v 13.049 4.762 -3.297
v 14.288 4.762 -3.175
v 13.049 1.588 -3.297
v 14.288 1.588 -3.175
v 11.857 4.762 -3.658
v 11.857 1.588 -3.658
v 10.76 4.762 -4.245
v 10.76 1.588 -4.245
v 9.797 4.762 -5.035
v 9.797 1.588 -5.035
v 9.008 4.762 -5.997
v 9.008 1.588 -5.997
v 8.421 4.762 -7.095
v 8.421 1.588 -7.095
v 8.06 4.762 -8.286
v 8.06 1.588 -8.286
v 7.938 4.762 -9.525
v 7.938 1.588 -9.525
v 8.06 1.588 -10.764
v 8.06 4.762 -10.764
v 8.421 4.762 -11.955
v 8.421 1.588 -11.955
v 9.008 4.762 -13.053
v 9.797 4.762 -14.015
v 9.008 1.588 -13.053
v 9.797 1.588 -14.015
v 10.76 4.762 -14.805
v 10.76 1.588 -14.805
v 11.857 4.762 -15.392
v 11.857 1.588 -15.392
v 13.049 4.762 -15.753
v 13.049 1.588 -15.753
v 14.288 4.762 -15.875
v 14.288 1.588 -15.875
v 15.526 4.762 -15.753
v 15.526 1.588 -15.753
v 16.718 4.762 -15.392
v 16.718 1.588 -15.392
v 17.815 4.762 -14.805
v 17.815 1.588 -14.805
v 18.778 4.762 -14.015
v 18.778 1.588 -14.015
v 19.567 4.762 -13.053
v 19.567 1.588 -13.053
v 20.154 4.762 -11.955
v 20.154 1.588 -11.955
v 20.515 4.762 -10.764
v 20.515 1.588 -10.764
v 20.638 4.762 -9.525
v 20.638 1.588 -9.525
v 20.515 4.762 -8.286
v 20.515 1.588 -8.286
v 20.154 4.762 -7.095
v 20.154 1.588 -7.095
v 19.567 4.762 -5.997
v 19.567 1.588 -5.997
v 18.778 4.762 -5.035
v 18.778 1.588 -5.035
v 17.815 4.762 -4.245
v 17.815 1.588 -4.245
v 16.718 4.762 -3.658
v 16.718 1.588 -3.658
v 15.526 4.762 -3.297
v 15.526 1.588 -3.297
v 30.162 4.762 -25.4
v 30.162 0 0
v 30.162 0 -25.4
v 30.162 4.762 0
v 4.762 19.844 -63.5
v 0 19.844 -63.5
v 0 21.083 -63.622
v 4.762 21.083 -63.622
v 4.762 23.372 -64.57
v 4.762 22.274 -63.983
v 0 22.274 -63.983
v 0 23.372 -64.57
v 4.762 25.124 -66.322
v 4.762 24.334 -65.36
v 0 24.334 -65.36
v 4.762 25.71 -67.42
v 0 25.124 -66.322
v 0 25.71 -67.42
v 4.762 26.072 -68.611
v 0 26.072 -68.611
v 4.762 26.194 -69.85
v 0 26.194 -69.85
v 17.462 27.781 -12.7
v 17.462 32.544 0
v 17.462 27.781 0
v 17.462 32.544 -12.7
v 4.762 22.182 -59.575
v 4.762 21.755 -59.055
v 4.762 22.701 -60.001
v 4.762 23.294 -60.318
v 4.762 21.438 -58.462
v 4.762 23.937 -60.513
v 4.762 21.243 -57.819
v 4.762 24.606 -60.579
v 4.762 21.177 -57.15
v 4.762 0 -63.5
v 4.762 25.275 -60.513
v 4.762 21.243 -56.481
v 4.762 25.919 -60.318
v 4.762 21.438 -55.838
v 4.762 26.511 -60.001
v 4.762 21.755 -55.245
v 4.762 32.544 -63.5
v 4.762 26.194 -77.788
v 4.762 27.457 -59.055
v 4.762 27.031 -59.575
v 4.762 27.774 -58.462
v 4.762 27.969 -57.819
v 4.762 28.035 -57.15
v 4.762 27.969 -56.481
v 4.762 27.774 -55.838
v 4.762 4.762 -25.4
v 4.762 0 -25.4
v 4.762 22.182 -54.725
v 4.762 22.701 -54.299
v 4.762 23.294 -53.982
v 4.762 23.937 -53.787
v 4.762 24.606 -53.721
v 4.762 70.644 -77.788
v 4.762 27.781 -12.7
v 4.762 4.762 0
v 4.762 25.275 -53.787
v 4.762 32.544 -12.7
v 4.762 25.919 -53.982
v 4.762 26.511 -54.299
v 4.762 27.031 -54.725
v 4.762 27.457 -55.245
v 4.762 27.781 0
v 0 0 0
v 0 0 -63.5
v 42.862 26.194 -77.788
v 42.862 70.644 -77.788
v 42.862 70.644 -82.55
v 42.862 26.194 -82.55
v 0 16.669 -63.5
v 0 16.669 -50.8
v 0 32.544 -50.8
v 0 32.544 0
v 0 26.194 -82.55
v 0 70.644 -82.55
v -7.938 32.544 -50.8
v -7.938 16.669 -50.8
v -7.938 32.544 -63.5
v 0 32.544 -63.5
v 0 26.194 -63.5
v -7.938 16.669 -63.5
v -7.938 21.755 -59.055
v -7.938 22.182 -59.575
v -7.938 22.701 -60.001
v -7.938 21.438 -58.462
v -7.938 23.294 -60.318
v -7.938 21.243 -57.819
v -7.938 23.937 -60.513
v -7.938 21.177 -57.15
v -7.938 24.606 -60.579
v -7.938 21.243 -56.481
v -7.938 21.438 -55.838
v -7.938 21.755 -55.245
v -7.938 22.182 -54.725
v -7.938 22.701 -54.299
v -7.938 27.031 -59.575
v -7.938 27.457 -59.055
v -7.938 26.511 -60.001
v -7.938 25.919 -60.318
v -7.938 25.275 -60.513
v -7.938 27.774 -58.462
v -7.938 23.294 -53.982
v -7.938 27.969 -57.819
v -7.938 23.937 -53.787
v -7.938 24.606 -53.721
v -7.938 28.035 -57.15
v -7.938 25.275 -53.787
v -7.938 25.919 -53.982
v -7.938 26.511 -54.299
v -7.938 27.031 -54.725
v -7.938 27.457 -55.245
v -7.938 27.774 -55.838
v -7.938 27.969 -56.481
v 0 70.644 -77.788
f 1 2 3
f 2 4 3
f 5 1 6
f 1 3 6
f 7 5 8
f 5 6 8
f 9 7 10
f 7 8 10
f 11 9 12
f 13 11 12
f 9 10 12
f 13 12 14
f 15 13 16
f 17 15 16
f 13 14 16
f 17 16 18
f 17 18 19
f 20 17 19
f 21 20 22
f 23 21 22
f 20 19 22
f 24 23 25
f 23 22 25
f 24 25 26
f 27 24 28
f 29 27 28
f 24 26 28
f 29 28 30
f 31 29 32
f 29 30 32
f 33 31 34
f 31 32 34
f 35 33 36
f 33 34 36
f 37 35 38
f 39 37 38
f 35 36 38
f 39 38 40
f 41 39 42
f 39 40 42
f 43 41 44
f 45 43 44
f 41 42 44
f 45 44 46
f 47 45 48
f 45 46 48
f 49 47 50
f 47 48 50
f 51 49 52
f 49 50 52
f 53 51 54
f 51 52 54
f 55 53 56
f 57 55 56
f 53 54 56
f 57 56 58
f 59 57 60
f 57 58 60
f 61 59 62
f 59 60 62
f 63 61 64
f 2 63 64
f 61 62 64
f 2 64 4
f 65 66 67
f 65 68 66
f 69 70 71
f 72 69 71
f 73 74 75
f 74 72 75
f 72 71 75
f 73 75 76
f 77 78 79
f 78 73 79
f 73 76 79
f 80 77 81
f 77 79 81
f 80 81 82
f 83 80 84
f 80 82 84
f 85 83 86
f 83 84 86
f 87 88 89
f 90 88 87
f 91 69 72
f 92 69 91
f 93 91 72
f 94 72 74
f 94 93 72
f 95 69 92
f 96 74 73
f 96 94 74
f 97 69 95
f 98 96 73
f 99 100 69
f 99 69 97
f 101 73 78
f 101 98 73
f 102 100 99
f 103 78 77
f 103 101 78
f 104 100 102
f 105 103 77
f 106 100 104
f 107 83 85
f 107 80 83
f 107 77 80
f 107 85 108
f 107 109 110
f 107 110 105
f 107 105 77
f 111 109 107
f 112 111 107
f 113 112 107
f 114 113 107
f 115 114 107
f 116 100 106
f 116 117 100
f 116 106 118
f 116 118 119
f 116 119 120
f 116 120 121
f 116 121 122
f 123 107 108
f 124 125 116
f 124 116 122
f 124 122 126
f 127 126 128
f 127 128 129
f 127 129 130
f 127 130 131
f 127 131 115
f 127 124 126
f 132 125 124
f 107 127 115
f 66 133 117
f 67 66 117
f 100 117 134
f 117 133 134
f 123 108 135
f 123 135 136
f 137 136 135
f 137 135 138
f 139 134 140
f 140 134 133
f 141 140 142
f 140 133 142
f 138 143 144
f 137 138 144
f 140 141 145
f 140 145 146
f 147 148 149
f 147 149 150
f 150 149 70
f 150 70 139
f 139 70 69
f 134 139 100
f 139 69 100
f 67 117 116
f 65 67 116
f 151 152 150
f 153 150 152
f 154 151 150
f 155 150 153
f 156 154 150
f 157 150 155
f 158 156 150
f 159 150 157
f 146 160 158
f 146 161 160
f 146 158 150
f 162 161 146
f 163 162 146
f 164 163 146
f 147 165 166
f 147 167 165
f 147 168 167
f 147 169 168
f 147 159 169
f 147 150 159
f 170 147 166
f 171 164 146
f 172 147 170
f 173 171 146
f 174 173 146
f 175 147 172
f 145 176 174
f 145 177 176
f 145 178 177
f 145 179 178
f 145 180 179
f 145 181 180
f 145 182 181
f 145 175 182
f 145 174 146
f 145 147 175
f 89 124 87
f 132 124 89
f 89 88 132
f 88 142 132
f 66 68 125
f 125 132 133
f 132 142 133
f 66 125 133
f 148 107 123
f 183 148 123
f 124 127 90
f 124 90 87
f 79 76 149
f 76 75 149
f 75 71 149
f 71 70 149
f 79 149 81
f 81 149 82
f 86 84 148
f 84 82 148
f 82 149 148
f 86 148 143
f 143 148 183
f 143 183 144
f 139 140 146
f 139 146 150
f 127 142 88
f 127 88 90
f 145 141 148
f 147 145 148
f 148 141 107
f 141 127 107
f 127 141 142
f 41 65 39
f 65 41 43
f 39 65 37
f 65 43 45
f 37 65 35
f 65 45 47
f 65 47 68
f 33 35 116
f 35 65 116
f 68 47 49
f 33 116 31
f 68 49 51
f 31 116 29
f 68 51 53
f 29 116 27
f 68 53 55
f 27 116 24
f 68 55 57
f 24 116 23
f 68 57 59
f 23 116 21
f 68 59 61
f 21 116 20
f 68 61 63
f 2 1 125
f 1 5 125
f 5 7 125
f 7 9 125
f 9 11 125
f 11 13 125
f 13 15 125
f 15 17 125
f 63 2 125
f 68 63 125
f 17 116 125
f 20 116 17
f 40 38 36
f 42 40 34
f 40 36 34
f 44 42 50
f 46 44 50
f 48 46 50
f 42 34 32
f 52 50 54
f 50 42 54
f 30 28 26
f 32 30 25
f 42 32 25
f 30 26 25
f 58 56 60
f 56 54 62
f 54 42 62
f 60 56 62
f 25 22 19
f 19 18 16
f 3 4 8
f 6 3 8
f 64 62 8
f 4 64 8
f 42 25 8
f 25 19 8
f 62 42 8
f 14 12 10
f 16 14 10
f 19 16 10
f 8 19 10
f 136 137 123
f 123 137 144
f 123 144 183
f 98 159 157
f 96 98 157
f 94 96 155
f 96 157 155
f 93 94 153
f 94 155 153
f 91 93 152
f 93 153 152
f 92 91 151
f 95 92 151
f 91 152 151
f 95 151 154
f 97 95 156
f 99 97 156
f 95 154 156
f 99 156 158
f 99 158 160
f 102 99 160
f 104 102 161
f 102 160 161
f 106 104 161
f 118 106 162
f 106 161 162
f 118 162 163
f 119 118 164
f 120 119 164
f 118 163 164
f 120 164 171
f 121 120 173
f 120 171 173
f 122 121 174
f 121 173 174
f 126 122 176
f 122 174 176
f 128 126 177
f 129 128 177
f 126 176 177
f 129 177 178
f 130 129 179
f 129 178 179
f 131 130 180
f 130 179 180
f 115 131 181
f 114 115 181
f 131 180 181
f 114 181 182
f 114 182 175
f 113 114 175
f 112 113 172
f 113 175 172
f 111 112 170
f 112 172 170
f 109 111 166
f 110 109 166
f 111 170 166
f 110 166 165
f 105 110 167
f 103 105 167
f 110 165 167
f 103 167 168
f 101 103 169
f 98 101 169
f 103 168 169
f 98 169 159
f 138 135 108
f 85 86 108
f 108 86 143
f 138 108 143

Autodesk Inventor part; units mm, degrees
ref_plane "YZ Plane" through (0, 0, 0) normal (1, 0, 0) x (0, 1, 0)
ref_plane "XZ Plane" through (0, 0, 0) normal (0, 1, 0) x (-1, 0, 0)
ref_plane "XY Plane" through (0, 0, 0) normal (0, 0, 1) x (1, 0, 0)
sketch "Sketch1" plane through (0, 0, 0) normal (1, 0, 0) x (0, 1, 0)
  line L0 (0, 0) -> (32.5438, 0)
  line L1 (32.5438, 0) -> (32.5438, -63.5)
  line L2 (32.5438, -63.5) -> (0, -63.5)
  line L3 (0, -63.5) -> (0, 0)
  dimension "d0" = 32.5438
  dimension "d1" = 63.5
extrude "Extrusion1" add sketch "Sketch1" along normal blind 4.7625
sketch "Sketch2" plane through (4.7625, 0, 0) normal (1, 0, 0) x (0, 0, -1)
  line L0 (0, 32.5438) -> (0, 0) projected
  line L1 (0, 0) -> (63.5, 0) projected
  line L2 (63.5, 0) -> (63.5, 32.5438) projected
  line L3 (63.5, 32.5438) -> (0, 32.5438) projected
  line L4 (0, 32.5438) -> (12.7, 32.5438)
  line L5 (12.7, 32.5438) -> (12.7, 27.7812)
  line L6 (12.7, 27.7812) -> (0, 27.7812)
  line L7 (0, 27.7812) -> (0, 32.5438)
  dimension "d4" = 12.7
  dimension "d5" = 4.7625
extrude "Extrusion2" add sketch "Sketch2" along normal blind 12.7 contours L3 L5 L6 L0
sketch "Sketch3" plane through (4.7625, 0, 0) normal (1, 0, 0) x (0, 0, -1)
  line L0 (12.7, 27.7812) -> (0, 27.7812) projected
  line L1 (0, 27.7812) -> (0, 0) projected
  line L2 (0, 0) -> (63.5, 0) projected
  line L3 (63.5, 0) -> (63.5, 32.5438) projected
  line L4 (63.5, 32.5438) -> (12.7, 32.5438) projected
  line L5 (12.7, 32.5438) -> (12.7, 27.7812) projected
  line L6 (0, 0) -> (25.4, 0)
  line L7 (25.4, 0) -> (25.4, 4.7625)
  line L8 (25.4, 4.7625) -> (0, 4.7625)
  line L9 (0, 4.7625) -> (0, 0)
  dimension "d8" = 4.7625
extrude "Extrusion3" add sketch "Sketch3" along normal blind 25.4 contours L8 L7 L2 L1
sketch "Sketch4" plane through (0, 0, 0) normal (-1, 0, 0) x (0, 0, 1)
  line L0 (0, 0) -> (0, 32.5438) projected
  line L1 (0, 32.5438) -> (-63.5, 32.5438) projected
  line L2 (-63.5, 32.5438) -> (-63.5, 0) projected
  line L3 (-63.5, 0) -> (0, 0) projected
  line L4 (-63.5, 32.5438) -> (-12.7, 32.5438) projected
  line L5 (-63.5, 32.5438) -> (-50.8, 32.5438)
  line L6 (-50.8, 32.5438) -> (-50.8, 16.6688)
  line L7 (-50.8, 16.6688) -> (-63.5, 16.6688)
  line L8 (-63.5, 16.6688) -> (-63.5, 32.5438)
  dimension "d11" = 12.7
  dimension "d12" = 15.875
extrude "Extrusion4" add sketch "Sketch4" along normal blind 7.9375 contours L2 L1 L6 L7
sketch "Sketch5" plane through (4.7625, 0, 0) normal (1, 0, 0) x (0, 0, -1)
  line L0 (25.4, 4.7625) -> (25.4, 0) projected
  line L1 (25.4, 0) -> (63.5, 0) projected
  line L2 (63.5, 0) -> (63.5, 32.5438) projected
  line L3 (63.5, 32.5438) -> (12.7, 32.5438) projected
  line L4 (12.7, 32.5438) -> (12.7, 27.7812) projected
  line L5 (12.7, 27.7812) -> (0, 27.7812) projected
  line L6 (0, 27.7812) -> (0, 4.7625) projected
  line L7 (0, 4.7625) -> (25.4, 4.7625) projected
  line L8 (0, 32.5438) -> (0, 27.7812) projected
  line L9 (0, 27.7812) -> (12.7, 27.7812) projected
  line L10 (12.7, 27.7812) -> (12.7, 32.5438) projected
  line L11 (12.7, 32.5438) -> (0, 32.5438) projected
  point P0 (0, 0)
  point P1 (57.15, 24.6063)
  dimension "d15" = 4.7625
  dimension "d16" = 7.9375
  dimension "d17" = 6.35
hole "Hole1" at (4.7625, 24.6063, -57.15) direction (-1, 0, 0) diameter 6.858 end through all
sketch "Sketch6" plane through (4.7625, 4.7625, 0) normal (0, 1, 0) x (1, 0, 0)
  line L0 (0, 0) -> (0, 25.4) projected
  line L1 (0, 0) -> (25.4, 0) projected
  line L2 (25.4, 25.4) -> (25.4, 0) projected
  line L3 (0, 25.4) -> (25.4, 25.4) projected
  point P0 (-4.7625, 0)
  point P1 (9.525, 9.525)
  dimension "d25" = 9.525
  dimension "d26" = 9.525
hole "Hole2" at (14.2875, 4.7625, -9.525) direction (0, -1, 0) diameter 12.7 depth 3.175
sketch "Sketch8" plane through (4.7625, 0, 0) normal (1, 0, 0) x (0, 0, -1)
  circle A0 centre (57.15, 24.6063) radius 3.429 projected
  line L0 (25.4, 4.7625) -> (25.4, 0) projected
  line L1 (25.4, 0) -> (63.5, 0) projected
  line L2 (63.5, 0) -> (63.5, 32.5438) projected
  line L3 (63.5, 32.5438) -> (12.7, 32.5438) projected
  line L4 (12.7, 32.5438) -> (12.7, 27.7812) projected
  line L5 (12.7, 27.7812) -> (0, 27.7812) projected
  line L6 (0, 27.7812) -> (0, 4.7625) projected
  line L7 (0, 4.7625) -> (25.4, 4.7625) projected
  line L8 (63.5, 32.5438) -> (77.7875, 70.6438)
  line L9 (63.5, 32.5438) -> (104.1908, 32.5438) construction
  line L10 (77.7875, 70.6438) -> (82.55, 70.6438)
  line L11 (82.55, 70.6438) -> (82.55, 26.1938)
  line L12 (82.55, 26.1938) -> (77.7875, 26.1938)
  line L13 (77.7875, 26.1938) -> (77.7875, 70.6438)
  line L14 (77.7875, 26.1938) -> (63.5, 26.1938)
  point P0 (0, 0)
  dimension "d39" = 4.7625
  dimension "d40" = 44.45
  dimension "d41" = 38.1
  dimension "d47" = 25.4
extrude "Extrusion6" add sketch "Sketch8" against normal blind 4.7625 contours L2 L8 L13 L14 | L13 L10 L11 L12
sketch "Sketch9" plane through (4.7625, 0, 0) normal (1, 0, 0) x (0, 0, -1)
  circle A0 centre (57.15, 24.6063) radius 3.429 projected
  line L0 (25.4, 4.7625) -> (25.4, 0) projected
  line L1 (25.4, 0) -> (63.5, 0) projected
  line L2 (63.5, 0) -> (63.5, 26.1938) projected
  line L3 (63.5, 26.1938) -> (82.55, 26.1938) projected
  line L4 (82.55, 26.1938) -> (82.55, 70.6438) projected
  line L5 (82.55, 70.6438) -> (77.7875, 70.6438) projected
  line L6 (77.7875, 70.6438) -> (63.5, 32.5438) projected
  line L7 (63.5, 32.5438) -> (12.7, 32.5438) projected
  line L8 (12.7, 32.5438) -> (12.7, 27.7812) projected
  line L9 (12.7, 27.7812) -> (0, 27.7812) projected
  line L10 (0, 27.7812) -> (0, 4.7625) projected
  line L11 (0, 4.7625) -> (25.4, 4.7625) projected
  line L12 (77.7875, 70.6438) -> (82.55, 70.6438) projected
  line L13 (82.55, 38.8938) -> (82.55, 70.6438)
  line L14 (82.55, 26.1938) -> (82.55, 70.6438) projected
  line L15 (77.7875, 70.6438) -> (82.55, 70.6438)
  line L16 (82.55, 70.6438) -> (82.55, 26.1938)
  line L17 (82.55, 26.1938) -> (77.7875, 26.1938)
  line L18 (77.7875, 26.1938) -> (77.7875, 70.6438)
  point P0 (0, 0)
  point P1 (88.9, 26.1938)
extrude "Extrusion7" add sketch "Sketch9" along normal blind 38.1 contours L18 L5 L4 L3
fillet "Fillet1" radius 6.35 1 edges at (2.3813, 26.1938, -63.5)
properties part number "WheelIntake4.0Base"
